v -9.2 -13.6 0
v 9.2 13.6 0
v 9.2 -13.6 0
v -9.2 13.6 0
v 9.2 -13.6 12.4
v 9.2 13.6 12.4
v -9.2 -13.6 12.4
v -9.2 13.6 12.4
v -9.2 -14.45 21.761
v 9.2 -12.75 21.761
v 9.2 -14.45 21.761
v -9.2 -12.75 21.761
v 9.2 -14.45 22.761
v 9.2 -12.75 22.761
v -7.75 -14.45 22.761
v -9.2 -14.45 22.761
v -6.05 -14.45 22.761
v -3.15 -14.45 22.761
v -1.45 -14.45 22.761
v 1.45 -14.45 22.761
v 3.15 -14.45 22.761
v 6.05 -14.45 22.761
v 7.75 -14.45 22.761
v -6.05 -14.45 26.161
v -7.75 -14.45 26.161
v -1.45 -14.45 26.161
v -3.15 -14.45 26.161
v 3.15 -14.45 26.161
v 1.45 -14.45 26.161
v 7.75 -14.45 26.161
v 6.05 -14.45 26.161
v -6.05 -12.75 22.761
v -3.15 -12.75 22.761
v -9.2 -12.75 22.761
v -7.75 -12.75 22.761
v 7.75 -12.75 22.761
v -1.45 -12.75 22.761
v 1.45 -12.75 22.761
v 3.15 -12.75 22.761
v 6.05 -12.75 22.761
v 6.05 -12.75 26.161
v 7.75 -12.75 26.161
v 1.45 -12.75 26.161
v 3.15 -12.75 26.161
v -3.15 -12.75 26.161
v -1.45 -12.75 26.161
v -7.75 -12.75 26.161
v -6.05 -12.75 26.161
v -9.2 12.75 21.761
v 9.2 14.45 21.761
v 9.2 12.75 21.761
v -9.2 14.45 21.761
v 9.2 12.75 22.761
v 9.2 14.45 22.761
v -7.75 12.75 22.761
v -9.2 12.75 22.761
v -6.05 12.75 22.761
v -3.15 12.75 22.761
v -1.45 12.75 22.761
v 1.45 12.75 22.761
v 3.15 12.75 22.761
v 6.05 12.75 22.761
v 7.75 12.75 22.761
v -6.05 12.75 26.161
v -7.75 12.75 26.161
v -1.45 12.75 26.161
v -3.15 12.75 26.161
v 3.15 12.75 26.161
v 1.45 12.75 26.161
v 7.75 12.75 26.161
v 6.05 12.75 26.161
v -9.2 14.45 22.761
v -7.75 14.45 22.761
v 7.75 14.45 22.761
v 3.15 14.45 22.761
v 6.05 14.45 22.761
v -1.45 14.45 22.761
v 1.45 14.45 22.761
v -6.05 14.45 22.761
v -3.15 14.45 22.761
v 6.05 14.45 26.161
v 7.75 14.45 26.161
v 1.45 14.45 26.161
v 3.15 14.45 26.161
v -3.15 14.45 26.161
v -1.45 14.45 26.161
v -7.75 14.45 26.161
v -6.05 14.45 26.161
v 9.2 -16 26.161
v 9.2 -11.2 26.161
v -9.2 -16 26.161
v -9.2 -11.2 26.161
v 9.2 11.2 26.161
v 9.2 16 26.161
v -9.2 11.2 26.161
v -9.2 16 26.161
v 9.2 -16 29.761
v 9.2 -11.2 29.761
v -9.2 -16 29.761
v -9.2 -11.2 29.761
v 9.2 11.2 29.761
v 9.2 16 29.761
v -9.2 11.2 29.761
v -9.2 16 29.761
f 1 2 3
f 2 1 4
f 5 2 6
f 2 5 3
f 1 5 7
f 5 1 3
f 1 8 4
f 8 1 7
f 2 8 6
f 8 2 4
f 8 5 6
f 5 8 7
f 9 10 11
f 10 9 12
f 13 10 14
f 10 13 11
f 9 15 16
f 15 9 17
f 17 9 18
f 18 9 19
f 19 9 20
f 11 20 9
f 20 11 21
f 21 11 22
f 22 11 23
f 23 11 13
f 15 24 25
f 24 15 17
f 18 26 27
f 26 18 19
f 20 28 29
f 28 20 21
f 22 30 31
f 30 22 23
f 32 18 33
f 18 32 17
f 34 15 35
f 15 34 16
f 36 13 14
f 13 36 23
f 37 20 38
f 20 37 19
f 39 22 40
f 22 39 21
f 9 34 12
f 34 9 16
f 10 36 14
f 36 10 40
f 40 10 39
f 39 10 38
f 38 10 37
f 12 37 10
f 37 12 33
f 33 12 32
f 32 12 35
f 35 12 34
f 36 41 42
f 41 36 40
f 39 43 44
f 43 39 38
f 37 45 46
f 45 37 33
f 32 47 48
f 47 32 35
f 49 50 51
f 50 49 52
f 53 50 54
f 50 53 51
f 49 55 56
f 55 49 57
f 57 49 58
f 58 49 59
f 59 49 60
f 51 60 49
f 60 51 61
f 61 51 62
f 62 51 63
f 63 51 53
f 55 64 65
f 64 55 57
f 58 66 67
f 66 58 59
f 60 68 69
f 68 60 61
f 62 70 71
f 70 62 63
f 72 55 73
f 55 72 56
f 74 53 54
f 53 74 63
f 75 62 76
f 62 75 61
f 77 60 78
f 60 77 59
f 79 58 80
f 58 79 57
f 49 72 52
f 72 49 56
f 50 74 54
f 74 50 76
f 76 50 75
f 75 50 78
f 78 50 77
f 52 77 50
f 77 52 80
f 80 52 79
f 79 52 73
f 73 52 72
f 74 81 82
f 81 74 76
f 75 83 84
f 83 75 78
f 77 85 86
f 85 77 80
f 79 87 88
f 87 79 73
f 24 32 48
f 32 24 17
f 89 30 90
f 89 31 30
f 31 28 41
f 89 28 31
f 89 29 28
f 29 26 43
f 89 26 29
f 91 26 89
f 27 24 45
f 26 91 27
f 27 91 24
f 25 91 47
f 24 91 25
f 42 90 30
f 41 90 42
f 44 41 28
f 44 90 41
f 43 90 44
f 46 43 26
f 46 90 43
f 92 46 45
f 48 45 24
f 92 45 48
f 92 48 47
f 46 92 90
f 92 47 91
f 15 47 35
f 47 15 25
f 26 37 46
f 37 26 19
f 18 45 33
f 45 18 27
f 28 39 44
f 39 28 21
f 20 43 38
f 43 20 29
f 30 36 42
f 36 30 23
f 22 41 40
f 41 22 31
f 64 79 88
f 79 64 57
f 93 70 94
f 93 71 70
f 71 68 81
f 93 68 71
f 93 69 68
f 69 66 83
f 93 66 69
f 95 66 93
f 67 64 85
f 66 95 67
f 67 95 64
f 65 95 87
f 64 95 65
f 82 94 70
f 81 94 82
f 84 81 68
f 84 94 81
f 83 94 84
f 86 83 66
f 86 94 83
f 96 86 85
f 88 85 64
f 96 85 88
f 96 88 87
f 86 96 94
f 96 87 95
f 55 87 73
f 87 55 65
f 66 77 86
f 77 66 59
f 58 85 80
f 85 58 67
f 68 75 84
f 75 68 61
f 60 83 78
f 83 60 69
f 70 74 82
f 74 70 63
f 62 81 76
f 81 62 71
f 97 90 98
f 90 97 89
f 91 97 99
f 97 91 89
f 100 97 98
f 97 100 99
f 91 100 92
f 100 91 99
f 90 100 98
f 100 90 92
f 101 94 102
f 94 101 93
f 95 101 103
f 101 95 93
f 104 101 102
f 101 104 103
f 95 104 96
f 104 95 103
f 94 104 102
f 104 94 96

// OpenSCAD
// Generated by SolidPython 0.4.2 on 2020-09-29 23:20:55
//!OpenSCAD

scale(v = 0.0100000000) {
	translate(v = [-920, -1360, 0]) {
		union() {
			color(c = [0.4000000000, 0.4000000000, 0.4000000000]) {
				translate(v = [0, 0, 0]) {
					linear_extrude(height = 1000.0000000000) {
						polygon(paths = [[0, 1, 2, 3]], points = [[0, 0], [0, 2720], [1840, 2720], [1840, 0]]);
					}
				}
			}
			color(c = [0.2000000000, 0.6000000000, 0.2000000000]) {
				translate(v = [0, 0, 1000.0000000000]) {
					linear_extrude(height = 120.0000000000) {
						polygon(paths = [[0, 1, 2, 3]], points = [[0, 1305], [0, 2720], [1840, 2720], [1840, 1305]]);
					}
				}
			}
			color(c = [0.4000000000, 0.4000000000, 0.4000000000]) {
				translate(v = [0, 0, 1000.0000000000]) {
					linear_extrude(height = 120.0000000000) {
						polygon(paths = [[0, 1, 2, 3]], points = [[0, 0], [0, 1305], [1840, 1305], [1840, 0]]);
					}
				}
			}
			color(c = [0.2000000000, 0.6000000000, 0.2000000000]) {
				translate(v = [0, 0, 1120.0000000000]) {
					linear_extrude(height = 120.0000000000) {
						polygon(paths = [[0, 1, 2, 3]], points = [[0, 1305], [0, 2720], [1840, 2720], [1840, 1305]]);
					}
				}
			}
			color(c = [0.4000000000, 0.4000000000, 0.4000000000]) {
				translate(v = [0, 0, 1120.0000000000]) {
					linear_extrude(height = 120.0000000000) {
						polygon(paths = [[0, 1, 2, 3]], points = [[0, 0], [0, 1305], [1840, 1305], [1840, 0]]);
					}
				}
			}
			color(c = [0.9000000000, 0.6000000000, 0.6000000000]) {
				translate(v = [0, 0, 2176.1000000000]) {
					linear_extrude(height = 100.0000000000) {
						polygon(paths = [[0, 1, 2, 3]], points = [[0, -85], [0, 85], [1840, 85], [1840, -85]]);
					}
				}
			}
			color(c = [0.9000000000, 0.6000000000, 0.6000000000]) {
				translate(v = [0, 0, 2176.1000000000]) {
					linear_extrude(height = 100.0000000000) {
						polygon(paths = [[0, 1, 2, 3]], points = [[0, 2635], [0, 2805], [1840, 2805], [1840, 2635]]);
					}
				}
			}
			color(c = [0.5000000000, 0.5000000000, 0.5000000000]) {
				translate(v = [0, 0, 2276.1000000000]) {
					linear_extrude(height = 340.0000000000) {
						polygon(paths = [[0, 1, 2, 3]], points = [[145, -85], [145, 85], [315, 85], [315, -85]]);
					}
				}
			}
			color(c = [0.5000000000, 0.5000000000, 0.5000000000]) {
				translate(v = [0, 0, 2276.1000000000]) {
					linear_extrude(height = 340.0000000000) {
						polygon(paths = [[0, 1, 2, 3]], points = [[605, -85], [605, 85], [775, 85], [775, -85]]);
					}
				}
			}
			color(c = [0.5000000000, 0.5000000000, 0.5000000000]) {
				translate(v = [0, 0, 2276.1000000000]) {
					linear_extrude(height = 340.0000000000) {
						polygon(paths = [[0, 1, 2, 3]], points = [[1065, -85], [1065, 85], [1235, 85], [1235, -85]]);
					}
				}
			}
			color(c = [0.5000000000, 0.5000000000, 0.5000000000]) {
				translate(v = [0, 0, 2276.1000000000]) {
					linear_extrude(height = 340.0000000000) {
						polygon(paths = [[0, 1, 2, 3]], points = [[1525, -85], [1525, 85], [1695, 85], [1695, -85]]);
					}
				}
			}
			color(c = [0.5000000000, 0.5000000000, 0.5000000000]) {
				translate(v = [0, 0, 2276.1000000000]) {
					linear_extrude(height = 340.0000000000) {
						polygon(paths = [[0, 1, 2, 3]], points = [[145, 2635], [145, 2805], [315, 2805], [315, 2635]]);
					}
				}
			}
			color(c = [0.5000000000, 0.5000000000, 0.5000000000]) {
				translate(v = [0, 0, 2276.1000000000]) {
					linear_extrude(height = 340.0000000000) {
						polygon(paths = [[0, 1, 2, 3]], points = [[605, 2635], [605, 2805], [775, 2805], [775, 2635]]);
					}
				}
			}
			color(c = [0.5000000000, 0.5000000000, 0.5000000000]) {
				translate(v = [0, 0, 2276.1000000000]) {
					linear_extrude(height = 340.0000000000) {
						polygon(paths = [[0, 1, 2, 3]], points = [[1065, 2635], [1065, 2805], [1235, 2805], [1235, 2635]]);
					}
				}
			}
			color(c = [0.5000000000, 0.5000000000, 0.5000000000]) {
				translate(v = [0, 0, 2276.1000000000]) {
					linear_extrude(height = 340.0000000000) {
						polygon(paths = [[0, 1, 2, 3]], points = [[1525, 2635], [1525, 2805], [1695, 2805], [1695, 2635]]);
					}
				}
			}
			color(c = [0.3000000000, 0.3000000000, 1]) {
				translate(v = [0, 0, 2616.1000000000]) {
					linear_extrude(height = 360.0000000000) {
						polygon(paths = [[0, 1, 2, 3]], points = [[0, -240], [0, 240], [1840, 240], [1840, -240]]);
					}
				}
			}
			color(c = [0.3000000000, 0.3000000000, 1]) {
				translate(v = [0, 0, 2616.1000000000]) {
					linear_extrude(height = 360.0000000000) {
						polygon(paths = [[0, 1, 2, 3]], points = [[0, 2480], [0, 2960], [1840, 2960], [1840, 2480]]);
					}
				}
			}
		}
	}
}
